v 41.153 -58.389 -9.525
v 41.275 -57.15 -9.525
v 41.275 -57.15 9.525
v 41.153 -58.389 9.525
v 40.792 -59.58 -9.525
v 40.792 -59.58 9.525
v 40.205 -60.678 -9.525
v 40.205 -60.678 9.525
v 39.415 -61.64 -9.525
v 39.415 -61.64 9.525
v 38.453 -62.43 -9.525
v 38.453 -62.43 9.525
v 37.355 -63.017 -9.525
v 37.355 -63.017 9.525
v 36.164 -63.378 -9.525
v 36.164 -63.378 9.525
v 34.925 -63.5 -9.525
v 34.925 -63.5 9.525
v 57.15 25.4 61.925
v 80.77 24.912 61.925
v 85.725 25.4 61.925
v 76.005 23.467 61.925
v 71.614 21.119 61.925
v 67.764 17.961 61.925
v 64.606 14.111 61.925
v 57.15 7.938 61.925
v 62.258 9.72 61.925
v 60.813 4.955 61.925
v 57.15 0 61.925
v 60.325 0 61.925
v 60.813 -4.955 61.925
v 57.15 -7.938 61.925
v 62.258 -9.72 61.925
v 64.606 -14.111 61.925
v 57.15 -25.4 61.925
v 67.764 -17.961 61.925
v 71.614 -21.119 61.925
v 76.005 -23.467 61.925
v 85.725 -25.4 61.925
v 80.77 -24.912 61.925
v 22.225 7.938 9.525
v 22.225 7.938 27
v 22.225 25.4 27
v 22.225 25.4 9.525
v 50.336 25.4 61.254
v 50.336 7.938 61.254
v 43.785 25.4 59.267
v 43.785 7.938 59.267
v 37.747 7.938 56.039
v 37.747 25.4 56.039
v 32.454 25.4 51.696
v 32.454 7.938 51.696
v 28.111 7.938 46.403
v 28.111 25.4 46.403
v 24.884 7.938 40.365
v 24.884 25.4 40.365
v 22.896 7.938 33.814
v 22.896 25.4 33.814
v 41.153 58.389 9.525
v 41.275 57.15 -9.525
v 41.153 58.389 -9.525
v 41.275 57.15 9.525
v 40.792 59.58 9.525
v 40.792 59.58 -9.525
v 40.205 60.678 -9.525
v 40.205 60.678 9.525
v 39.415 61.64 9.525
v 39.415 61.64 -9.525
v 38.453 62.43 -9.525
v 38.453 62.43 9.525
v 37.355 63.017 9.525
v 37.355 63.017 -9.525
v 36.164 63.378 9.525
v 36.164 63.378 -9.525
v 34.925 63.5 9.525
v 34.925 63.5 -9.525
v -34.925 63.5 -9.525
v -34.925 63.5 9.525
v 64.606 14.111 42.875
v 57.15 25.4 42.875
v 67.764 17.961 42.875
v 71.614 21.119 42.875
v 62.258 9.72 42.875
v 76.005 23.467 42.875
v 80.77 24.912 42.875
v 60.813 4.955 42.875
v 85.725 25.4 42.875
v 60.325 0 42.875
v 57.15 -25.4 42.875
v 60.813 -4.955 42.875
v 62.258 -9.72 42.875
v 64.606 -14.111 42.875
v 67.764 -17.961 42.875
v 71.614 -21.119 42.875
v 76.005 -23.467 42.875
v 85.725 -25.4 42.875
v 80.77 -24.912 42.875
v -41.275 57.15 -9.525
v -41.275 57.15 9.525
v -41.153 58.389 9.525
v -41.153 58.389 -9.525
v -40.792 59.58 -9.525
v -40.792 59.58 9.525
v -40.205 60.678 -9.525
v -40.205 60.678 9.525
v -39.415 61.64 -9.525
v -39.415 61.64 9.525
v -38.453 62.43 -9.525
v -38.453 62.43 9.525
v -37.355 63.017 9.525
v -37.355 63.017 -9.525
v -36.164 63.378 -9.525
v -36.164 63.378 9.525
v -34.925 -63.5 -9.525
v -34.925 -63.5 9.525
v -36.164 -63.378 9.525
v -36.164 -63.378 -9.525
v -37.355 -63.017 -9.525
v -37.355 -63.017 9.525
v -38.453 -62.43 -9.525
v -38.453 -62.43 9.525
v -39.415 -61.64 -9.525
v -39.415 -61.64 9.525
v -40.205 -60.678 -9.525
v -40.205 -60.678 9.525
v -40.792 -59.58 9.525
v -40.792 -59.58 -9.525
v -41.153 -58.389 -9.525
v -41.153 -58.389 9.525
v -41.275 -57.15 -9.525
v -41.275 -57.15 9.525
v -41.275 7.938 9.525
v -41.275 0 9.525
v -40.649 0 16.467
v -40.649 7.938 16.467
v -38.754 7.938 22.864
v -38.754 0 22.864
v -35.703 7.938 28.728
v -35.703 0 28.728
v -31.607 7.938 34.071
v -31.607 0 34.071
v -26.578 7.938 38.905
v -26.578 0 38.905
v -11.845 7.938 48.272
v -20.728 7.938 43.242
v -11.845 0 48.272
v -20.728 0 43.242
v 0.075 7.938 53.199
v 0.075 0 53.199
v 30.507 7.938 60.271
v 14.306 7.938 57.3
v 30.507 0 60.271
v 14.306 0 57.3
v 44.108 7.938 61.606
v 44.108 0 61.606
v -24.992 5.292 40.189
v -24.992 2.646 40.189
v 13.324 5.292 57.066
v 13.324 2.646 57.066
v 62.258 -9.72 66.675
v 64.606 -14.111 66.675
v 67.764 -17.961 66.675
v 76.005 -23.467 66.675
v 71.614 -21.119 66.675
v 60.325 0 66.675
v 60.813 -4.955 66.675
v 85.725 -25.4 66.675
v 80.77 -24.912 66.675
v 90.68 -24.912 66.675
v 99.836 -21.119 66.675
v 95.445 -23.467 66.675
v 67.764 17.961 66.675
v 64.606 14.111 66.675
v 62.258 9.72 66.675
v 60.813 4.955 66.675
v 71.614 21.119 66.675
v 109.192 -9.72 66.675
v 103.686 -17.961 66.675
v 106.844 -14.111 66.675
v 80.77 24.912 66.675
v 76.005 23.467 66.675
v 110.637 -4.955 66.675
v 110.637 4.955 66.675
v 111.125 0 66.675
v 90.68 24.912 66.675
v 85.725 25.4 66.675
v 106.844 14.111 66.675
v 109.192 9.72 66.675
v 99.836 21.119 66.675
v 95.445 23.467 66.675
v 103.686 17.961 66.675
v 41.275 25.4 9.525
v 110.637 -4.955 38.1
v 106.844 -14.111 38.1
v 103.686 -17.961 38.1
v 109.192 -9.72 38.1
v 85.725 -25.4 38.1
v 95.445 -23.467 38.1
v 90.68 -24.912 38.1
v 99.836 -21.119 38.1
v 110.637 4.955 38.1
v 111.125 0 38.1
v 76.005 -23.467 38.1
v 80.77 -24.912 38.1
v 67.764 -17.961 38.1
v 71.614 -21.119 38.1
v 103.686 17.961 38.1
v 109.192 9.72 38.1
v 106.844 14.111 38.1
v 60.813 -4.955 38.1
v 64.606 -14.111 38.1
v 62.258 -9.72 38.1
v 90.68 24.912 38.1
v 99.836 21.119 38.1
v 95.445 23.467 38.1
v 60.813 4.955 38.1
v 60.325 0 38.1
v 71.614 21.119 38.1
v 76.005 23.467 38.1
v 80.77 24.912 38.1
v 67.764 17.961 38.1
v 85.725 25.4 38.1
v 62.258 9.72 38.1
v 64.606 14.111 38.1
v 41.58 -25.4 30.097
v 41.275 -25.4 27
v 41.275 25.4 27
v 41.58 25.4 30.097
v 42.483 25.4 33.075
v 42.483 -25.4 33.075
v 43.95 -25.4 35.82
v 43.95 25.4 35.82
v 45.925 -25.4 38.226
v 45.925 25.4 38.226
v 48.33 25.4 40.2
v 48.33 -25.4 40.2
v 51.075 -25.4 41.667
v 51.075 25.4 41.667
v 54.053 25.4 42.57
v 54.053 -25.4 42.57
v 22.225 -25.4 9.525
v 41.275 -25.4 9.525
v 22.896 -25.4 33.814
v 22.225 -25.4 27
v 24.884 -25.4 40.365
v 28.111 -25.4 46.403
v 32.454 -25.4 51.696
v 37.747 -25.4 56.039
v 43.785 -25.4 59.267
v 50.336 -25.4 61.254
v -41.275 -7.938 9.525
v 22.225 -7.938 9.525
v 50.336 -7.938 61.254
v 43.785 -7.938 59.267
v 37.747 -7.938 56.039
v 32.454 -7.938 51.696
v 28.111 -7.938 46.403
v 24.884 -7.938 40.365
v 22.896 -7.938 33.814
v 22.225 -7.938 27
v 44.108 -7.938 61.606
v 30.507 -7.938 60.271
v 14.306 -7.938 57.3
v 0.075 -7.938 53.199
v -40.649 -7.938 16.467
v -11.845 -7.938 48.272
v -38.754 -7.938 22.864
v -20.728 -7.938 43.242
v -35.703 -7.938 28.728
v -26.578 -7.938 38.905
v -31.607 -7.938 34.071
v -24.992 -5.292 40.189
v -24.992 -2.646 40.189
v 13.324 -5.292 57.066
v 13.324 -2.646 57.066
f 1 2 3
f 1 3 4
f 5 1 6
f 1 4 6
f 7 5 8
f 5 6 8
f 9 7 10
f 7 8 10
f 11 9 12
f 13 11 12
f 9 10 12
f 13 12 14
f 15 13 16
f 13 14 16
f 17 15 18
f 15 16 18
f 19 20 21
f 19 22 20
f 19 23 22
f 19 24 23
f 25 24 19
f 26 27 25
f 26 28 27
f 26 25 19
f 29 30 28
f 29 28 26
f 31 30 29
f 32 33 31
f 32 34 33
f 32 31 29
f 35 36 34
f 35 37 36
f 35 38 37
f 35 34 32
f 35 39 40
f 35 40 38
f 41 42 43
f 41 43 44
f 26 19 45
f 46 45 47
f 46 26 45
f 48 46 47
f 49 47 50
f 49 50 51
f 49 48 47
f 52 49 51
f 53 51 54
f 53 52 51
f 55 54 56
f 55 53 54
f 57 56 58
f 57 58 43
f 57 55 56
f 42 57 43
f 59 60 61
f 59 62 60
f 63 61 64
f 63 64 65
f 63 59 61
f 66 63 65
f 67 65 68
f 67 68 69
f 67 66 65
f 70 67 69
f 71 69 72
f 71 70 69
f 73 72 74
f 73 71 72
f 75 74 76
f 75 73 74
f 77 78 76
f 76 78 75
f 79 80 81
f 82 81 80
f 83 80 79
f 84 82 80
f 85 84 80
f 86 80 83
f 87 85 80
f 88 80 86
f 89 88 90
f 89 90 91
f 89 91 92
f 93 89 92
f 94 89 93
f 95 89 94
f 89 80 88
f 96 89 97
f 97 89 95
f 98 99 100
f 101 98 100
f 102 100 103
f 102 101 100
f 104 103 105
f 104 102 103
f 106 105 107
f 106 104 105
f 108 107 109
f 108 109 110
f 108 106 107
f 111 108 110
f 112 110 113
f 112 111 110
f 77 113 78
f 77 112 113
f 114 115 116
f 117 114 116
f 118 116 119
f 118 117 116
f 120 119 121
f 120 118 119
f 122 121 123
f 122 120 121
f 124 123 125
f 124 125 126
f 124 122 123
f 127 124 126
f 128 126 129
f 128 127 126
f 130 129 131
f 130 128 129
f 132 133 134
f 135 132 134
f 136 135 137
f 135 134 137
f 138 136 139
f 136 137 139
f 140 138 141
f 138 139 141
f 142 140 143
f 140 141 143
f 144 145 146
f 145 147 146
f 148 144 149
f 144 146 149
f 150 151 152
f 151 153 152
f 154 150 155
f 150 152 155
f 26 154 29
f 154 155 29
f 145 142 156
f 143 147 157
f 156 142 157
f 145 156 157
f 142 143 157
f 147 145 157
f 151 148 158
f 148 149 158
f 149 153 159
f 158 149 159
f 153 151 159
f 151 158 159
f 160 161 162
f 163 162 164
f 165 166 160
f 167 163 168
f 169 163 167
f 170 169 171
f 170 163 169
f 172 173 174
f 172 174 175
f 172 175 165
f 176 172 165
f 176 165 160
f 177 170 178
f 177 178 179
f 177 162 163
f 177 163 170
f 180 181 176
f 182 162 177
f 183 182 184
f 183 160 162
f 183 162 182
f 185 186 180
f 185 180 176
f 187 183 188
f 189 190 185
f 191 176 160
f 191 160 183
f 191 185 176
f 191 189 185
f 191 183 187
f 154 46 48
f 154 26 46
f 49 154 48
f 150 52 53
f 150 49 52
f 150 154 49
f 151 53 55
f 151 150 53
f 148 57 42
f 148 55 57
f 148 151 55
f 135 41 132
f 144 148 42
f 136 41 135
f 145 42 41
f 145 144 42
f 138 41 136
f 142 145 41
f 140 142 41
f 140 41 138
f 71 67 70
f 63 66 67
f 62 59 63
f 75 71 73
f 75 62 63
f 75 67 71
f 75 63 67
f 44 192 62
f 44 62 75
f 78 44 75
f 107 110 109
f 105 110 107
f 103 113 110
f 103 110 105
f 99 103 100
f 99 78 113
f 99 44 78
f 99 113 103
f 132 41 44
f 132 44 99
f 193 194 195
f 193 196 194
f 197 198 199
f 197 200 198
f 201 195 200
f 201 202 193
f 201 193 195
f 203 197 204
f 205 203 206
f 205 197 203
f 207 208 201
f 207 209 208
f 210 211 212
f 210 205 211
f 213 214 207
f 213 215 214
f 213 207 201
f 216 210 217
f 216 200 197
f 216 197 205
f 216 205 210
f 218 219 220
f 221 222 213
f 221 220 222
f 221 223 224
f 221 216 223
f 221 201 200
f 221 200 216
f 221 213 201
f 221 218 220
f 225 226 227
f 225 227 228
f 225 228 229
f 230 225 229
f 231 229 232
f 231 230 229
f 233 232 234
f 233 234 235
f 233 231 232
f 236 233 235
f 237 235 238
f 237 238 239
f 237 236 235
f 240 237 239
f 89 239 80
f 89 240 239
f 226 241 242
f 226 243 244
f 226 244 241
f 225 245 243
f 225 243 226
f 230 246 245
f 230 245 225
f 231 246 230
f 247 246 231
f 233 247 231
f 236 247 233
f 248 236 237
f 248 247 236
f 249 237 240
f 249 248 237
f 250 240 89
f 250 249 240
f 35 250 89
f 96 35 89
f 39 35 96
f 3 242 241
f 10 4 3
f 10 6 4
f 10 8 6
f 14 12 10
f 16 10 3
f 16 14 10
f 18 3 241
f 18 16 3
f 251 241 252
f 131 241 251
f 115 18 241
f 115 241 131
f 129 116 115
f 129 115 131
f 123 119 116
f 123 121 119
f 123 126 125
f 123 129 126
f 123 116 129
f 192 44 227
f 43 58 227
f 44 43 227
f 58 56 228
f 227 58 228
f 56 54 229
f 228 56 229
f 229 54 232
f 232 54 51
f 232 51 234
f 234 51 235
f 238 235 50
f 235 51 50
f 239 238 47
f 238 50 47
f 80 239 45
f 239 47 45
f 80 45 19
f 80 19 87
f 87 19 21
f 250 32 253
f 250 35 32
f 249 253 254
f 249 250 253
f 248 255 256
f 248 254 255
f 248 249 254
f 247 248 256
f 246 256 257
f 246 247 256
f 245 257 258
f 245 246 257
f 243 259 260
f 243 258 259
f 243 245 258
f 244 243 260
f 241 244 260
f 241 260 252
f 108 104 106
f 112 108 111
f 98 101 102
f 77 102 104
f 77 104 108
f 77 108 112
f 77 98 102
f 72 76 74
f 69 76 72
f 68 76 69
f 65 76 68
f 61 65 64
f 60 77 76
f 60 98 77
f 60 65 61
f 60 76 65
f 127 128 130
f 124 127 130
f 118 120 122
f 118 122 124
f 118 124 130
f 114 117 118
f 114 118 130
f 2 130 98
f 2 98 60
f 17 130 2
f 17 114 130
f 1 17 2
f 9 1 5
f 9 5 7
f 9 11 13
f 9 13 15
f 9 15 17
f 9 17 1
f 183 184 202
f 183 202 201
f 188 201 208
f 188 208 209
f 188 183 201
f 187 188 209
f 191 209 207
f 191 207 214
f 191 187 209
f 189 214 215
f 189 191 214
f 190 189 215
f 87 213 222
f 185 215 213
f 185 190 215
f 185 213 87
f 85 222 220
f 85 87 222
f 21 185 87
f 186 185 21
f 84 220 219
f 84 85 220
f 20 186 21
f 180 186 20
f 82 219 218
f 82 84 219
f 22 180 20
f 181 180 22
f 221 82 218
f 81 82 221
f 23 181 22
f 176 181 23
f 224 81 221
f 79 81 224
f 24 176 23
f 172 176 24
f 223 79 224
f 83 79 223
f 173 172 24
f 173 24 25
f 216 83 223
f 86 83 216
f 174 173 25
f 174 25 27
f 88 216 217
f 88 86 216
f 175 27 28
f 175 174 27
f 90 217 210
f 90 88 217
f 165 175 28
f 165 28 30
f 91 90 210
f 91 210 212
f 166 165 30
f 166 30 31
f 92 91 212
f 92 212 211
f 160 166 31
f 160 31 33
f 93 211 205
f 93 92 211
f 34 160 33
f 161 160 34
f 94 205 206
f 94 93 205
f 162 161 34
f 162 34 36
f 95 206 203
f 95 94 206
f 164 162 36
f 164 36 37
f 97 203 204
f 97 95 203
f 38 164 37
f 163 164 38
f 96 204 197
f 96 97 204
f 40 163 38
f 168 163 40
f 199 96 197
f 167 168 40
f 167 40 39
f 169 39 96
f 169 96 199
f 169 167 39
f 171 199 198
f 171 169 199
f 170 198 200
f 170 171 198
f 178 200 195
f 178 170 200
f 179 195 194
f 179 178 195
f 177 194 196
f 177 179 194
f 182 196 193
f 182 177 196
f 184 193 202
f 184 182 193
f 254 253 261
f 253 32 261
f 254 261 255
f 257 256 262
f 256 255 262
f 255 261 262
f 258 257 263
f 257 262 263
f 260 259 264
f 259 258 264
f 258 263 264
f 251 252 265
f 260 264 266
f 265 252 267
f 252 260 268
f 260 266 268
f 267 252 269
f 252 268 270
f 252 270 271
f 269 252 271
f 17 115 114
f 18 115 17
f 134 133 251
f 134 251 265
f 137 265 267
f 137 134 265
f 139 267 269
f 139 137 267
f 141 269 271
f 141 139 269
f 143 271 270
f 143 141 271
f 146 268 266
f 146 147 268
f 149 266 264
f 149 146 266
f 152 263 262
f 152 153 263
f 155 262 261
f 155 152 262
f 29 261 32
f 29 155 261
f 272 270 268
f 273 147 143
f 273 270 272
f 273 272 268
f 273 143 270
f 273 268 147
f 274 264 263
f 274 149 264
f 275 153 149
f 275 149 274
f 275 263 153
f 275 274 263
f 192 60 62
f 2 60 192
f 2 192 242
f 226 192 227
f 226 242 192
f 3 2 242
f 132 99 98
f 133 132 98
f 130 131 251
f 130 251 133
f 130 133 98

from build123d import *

# Parameters (mm, degrees)
F1_DEPTH = 63.5
F0_W     = 25.4
F0_H     = 19.05
F2_DEPTH = 25.4
F3_DEPTH = 7.9375
F5_R     = 6.35


# Not quite as in the source:
# - a feature names something its author has since deleted; it is built from what else it names


with BuildPart() as f1:
    # F0 (on Front) → F1 (new body, symmetric)
    with BuildSketch(Plane.XZ):
        Polygon((-41.275, 9.525), (-41.275, -9.525), (41.275, -9.525), (41.275, 9.525), (22.225, 9.525), align=None)
    extrude(amount=F1_DEPTH, both=True)

    # F0 (on Front) → F2 (join, symmetric)
    with BuildSketch(Plane.XZ):
        with BuildLine():
            Line((22.225, 9.525), (41.275, 9.525))
            Line((41.275, 9.525), (41.275, 27.0002))
            ThreePointArc((41.275, 27.0002), (45.9246798487, 38.2255201513), (57.15, 42.8752))
            Line((57.15, 42.8752), (60.325, 42.8752))
            Line((60.325, 42.8752), (60.325, 61.9252))
            Line((60.325, 61.9252), (57.15, 61.9252))
            ThreePointArc((57.15, 61.9252), (32.4542956671, 51.6959043329), (22.225, 27.0002))
            Line((22.225, 27.0002), (22.225, 9.525))
        make_face()
        with Locations((73.025, 52.4002)):
            Rectangle(F0_W, F0_H)
    extrude(amount=F2_DEPTH, both=True)

    # F0 (on Front) → F3 (join, symmetric)
    with BuildSketch(Plane.XZ):
        with BuildLine():
            add(Edge.make_bspline(
                [(-41.275, 9.525), (-41.515853256, 47.6718097925), (16.0763282329, 62.4862834811), (57.15, 61.9252)],
                knots=[0, 0, 0, 0, 111.5045361635, 111.5045361635, 111.5045361635, 111.5045361635], degree=3))
            Line((-41.275, 9.525), (22.225, 9.525))
            Line((22.225, 9.525), (22.225, 27.0002))
            ThreePointArc((22.225, 27.0002), (32.4542956671, 51.6959043329), (57.15, 61.9252))
        make_face()
    extrude(amount=F3_DEPTH, both=True)

    # F0 (on Front) → F4 (revolve)
    with BuildSketch(Plane.XZ):
        Polygon((85.725, 66.675), (85.725, 61.9252), (85.725, 42.8752), (85.725, 38.1), (111.125, 38.1), (111.125, 66.675), align=None)
    revolve(axis=Axis((85.725, 0, 52.3875), (0, 0, 1)))

    # F5
    f5_edges = [f1.edges().sort_by_distance(p)[0] for p in [
        (-41.275, -63.5, 0),
        (41.275, -63.5, 0),
        (41.275, 63.5, 0),
        (-41.275, 63.5, 0),
    ]]
    fillet(f5_edges, radius=F5_R)


solid = f1.part
